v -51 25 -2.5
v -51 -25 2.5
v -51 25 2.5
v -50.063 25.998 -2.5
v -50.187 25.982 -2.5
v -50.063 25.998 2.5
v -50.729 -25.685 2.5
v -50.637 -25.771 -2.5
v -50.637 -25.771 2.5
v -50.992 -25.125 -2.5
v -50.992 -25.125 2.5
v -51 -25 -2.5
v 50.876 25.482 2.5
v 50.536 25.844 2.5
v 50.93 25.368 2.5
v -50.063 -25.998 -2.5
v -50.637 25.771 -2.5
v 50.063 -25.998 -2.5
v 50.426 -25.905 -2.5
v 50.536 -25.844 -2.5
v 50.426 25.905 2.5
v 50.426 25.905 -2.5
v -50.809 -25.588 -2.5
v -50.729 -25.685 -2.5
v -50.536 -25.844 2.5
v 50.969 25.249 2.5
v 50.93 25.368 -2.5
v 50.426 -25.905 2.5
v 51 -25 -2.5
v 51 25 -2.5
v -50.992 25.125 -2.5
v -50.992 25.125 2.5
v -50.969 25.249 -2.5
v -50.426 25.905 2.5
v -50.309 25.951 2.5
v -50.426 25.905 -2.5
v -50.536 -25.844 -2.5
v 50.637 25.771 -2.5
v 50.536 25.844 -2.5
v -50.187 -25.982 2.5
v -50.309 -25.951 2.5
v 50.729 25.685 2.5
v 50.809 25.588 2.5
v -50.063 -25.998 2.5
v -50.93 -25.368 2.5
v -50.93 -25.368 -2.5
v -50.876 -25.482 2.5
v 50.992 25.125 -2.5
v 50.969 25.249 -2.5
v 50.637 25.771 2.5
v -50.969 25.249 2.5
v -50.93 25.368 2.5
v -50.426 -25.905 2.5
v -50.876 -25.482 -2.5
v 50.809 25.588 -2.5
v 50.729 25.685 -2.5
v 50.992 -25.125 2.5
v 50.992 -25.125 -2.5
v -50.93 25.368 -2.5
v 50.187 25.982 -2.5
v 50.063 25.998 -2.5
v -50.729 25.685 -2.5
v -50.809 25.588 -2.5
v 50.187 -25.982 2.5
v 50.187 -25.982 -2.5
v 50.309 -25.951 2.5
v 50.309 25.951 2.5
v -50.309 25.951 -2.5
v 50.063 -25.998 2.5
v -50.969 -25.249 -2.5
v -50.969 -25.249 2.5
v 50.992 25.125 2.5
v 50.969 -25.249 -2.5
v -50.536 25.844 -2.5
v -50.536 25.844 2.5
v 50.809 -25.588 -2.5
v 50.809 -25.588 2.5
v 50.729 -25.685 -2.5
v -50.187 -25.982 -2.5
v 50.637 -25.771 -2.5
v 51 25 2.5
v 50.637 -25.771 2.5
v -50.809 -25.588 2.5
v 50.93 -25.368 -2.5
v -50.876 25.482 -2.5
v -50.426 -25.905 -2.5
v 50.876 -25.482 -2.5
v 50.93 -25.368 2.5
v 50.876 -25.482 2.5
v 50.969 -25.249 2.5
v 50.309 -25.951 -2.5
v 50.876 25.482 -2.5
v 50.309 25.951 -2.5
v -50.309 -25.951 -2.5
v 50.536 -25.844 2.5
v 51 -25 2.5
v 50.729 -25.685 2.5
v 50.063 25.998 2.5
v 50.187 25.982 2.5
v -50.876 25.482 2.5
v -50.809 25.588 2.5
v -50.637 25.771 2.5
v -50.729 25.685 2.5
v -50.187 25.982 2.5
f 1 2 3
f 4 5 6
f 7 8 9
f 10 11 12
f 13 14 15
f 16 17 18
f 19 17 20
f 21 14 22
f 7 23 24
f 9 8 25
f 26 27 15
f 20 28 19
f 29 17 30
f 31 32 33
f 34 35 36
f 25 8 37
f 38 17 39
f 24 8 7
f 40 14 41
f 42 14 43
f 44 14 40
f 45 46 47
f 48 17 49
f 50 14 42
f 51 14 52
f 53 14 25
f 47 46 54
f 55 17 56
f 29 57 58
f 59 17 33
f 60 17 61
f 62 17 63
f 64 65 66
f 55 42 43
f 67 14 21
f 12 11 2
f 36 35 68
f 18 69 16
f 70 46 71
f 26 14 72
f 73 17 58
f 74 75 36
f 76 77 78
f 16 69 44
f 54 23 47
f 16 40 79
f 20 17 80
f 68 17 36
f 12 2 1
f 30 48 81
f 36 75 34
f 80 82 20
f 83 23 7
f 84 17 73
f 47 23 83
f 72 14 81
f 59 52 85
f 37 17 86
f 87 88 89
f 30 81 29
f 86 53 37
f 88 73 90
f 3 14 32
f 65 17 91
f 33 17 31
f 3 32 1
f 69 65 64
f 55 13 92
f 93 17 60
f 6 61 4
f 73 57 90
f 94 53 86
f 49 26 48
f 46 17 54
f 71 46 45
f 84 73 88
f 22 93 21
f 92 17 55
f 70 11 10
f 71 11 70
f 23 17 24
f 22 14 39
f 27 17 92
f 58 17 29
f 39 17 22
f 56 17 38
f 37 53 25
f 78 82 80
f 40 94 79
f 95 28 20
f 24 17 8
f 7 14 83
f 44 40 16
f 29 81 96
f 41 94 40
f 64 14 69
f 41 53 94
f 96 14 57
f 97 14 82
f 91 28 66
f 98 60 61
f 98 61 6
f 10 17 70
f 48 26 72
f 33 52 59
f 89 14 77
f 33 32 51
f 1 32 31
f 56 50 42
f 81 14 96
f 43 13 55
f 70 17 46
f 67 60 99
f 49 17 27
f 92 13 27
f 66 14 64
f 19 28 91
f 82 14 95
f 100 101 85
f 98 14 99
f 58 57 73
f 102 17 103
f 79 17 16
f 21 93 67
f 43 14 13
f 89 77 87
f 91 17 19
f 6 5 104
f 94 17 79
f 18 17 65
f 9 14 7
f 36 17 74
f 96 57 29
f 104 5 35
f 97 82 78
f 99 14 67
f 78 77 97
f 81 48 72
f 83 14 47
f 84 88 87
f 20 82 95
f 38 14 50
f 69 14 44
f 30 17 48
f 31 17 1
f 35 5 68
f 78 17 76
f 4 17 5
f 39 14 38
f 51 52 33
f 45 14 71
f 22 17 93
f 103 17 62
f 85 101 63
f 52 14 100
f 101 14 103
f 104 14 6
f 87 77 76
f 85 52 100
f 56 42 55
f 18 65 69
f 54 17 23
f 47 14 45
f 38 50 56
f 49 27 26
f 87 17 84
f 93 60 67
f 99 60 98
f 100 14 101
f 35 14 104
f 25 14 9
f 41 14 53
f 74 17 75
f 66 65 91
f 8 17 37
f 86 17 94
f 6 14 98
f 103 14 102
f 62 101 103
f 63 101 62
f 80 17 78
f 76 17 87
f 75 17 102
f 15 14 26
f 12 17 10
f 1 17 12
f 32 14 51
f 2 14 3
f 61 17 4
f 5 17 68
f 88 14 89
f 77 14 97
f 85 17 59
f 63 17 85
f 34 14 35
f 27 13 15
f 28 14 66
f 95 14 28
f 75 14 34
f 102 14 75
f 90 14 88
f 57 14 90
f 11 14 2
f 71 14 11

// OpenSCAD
sign_length = 100;
sign_width = 50;
sign_thickness = 4;

module warning_sign(length, width, thickness) {
	// base of the sign
	color([.9, .6, 0]) minkowski() {
		cube([length, width, thickness], center=true);
		cylinder(1, center=true, $fn=50);
	}

	color([0, 0, 0]) union() {
		translate([0, width/4, thickness]) text(
			"WARNING", valign="center", halign="center", size=width/6,
			font="Helvetica:style=Bold"
		);

		translate([0, width/32, thickness]) text(
			"ここにゴミ", valign="center", halign="center", font="Yu Mincho", size=width/10
		);
		translate([0, -width/16, thickness]) text(
			"捨てないで下さい", valign="center", halign="center", font="Yu Mincho", size=width/10
		);

		translate([0, -width/6, thickness]) text(
			"DO NOT DUMB HERE", valign="top", halign="center", size=width/10
		);
		translate([0, -width/3, thickness]) text(
			"NO DUMB AREA", valign="top", halign="center", size=width/10
		);

		// Hexagon around "WARNING"
		difference() {
			cube([length - 2, width - 2, thickness+2], center=true);
			cube([length - 3, width - 3, thickness+3], center=true);
		}
		difference() {
			translate([0, width/4, 0]) cube([length-4, width/3, thickness+2], center=true);
			minkowski() {
				scale([8 , 1, 1]) translate([0, width/4, 0]) rotate([0,0,30])
					cylinder(h=thickness+2, r=(width/8), center=true, $fn=6);
				cylinder(1, center=true, $fn=50);
			}
		}
	}
}

warning_sign(sign_length, sign_width, sign_thickness);
